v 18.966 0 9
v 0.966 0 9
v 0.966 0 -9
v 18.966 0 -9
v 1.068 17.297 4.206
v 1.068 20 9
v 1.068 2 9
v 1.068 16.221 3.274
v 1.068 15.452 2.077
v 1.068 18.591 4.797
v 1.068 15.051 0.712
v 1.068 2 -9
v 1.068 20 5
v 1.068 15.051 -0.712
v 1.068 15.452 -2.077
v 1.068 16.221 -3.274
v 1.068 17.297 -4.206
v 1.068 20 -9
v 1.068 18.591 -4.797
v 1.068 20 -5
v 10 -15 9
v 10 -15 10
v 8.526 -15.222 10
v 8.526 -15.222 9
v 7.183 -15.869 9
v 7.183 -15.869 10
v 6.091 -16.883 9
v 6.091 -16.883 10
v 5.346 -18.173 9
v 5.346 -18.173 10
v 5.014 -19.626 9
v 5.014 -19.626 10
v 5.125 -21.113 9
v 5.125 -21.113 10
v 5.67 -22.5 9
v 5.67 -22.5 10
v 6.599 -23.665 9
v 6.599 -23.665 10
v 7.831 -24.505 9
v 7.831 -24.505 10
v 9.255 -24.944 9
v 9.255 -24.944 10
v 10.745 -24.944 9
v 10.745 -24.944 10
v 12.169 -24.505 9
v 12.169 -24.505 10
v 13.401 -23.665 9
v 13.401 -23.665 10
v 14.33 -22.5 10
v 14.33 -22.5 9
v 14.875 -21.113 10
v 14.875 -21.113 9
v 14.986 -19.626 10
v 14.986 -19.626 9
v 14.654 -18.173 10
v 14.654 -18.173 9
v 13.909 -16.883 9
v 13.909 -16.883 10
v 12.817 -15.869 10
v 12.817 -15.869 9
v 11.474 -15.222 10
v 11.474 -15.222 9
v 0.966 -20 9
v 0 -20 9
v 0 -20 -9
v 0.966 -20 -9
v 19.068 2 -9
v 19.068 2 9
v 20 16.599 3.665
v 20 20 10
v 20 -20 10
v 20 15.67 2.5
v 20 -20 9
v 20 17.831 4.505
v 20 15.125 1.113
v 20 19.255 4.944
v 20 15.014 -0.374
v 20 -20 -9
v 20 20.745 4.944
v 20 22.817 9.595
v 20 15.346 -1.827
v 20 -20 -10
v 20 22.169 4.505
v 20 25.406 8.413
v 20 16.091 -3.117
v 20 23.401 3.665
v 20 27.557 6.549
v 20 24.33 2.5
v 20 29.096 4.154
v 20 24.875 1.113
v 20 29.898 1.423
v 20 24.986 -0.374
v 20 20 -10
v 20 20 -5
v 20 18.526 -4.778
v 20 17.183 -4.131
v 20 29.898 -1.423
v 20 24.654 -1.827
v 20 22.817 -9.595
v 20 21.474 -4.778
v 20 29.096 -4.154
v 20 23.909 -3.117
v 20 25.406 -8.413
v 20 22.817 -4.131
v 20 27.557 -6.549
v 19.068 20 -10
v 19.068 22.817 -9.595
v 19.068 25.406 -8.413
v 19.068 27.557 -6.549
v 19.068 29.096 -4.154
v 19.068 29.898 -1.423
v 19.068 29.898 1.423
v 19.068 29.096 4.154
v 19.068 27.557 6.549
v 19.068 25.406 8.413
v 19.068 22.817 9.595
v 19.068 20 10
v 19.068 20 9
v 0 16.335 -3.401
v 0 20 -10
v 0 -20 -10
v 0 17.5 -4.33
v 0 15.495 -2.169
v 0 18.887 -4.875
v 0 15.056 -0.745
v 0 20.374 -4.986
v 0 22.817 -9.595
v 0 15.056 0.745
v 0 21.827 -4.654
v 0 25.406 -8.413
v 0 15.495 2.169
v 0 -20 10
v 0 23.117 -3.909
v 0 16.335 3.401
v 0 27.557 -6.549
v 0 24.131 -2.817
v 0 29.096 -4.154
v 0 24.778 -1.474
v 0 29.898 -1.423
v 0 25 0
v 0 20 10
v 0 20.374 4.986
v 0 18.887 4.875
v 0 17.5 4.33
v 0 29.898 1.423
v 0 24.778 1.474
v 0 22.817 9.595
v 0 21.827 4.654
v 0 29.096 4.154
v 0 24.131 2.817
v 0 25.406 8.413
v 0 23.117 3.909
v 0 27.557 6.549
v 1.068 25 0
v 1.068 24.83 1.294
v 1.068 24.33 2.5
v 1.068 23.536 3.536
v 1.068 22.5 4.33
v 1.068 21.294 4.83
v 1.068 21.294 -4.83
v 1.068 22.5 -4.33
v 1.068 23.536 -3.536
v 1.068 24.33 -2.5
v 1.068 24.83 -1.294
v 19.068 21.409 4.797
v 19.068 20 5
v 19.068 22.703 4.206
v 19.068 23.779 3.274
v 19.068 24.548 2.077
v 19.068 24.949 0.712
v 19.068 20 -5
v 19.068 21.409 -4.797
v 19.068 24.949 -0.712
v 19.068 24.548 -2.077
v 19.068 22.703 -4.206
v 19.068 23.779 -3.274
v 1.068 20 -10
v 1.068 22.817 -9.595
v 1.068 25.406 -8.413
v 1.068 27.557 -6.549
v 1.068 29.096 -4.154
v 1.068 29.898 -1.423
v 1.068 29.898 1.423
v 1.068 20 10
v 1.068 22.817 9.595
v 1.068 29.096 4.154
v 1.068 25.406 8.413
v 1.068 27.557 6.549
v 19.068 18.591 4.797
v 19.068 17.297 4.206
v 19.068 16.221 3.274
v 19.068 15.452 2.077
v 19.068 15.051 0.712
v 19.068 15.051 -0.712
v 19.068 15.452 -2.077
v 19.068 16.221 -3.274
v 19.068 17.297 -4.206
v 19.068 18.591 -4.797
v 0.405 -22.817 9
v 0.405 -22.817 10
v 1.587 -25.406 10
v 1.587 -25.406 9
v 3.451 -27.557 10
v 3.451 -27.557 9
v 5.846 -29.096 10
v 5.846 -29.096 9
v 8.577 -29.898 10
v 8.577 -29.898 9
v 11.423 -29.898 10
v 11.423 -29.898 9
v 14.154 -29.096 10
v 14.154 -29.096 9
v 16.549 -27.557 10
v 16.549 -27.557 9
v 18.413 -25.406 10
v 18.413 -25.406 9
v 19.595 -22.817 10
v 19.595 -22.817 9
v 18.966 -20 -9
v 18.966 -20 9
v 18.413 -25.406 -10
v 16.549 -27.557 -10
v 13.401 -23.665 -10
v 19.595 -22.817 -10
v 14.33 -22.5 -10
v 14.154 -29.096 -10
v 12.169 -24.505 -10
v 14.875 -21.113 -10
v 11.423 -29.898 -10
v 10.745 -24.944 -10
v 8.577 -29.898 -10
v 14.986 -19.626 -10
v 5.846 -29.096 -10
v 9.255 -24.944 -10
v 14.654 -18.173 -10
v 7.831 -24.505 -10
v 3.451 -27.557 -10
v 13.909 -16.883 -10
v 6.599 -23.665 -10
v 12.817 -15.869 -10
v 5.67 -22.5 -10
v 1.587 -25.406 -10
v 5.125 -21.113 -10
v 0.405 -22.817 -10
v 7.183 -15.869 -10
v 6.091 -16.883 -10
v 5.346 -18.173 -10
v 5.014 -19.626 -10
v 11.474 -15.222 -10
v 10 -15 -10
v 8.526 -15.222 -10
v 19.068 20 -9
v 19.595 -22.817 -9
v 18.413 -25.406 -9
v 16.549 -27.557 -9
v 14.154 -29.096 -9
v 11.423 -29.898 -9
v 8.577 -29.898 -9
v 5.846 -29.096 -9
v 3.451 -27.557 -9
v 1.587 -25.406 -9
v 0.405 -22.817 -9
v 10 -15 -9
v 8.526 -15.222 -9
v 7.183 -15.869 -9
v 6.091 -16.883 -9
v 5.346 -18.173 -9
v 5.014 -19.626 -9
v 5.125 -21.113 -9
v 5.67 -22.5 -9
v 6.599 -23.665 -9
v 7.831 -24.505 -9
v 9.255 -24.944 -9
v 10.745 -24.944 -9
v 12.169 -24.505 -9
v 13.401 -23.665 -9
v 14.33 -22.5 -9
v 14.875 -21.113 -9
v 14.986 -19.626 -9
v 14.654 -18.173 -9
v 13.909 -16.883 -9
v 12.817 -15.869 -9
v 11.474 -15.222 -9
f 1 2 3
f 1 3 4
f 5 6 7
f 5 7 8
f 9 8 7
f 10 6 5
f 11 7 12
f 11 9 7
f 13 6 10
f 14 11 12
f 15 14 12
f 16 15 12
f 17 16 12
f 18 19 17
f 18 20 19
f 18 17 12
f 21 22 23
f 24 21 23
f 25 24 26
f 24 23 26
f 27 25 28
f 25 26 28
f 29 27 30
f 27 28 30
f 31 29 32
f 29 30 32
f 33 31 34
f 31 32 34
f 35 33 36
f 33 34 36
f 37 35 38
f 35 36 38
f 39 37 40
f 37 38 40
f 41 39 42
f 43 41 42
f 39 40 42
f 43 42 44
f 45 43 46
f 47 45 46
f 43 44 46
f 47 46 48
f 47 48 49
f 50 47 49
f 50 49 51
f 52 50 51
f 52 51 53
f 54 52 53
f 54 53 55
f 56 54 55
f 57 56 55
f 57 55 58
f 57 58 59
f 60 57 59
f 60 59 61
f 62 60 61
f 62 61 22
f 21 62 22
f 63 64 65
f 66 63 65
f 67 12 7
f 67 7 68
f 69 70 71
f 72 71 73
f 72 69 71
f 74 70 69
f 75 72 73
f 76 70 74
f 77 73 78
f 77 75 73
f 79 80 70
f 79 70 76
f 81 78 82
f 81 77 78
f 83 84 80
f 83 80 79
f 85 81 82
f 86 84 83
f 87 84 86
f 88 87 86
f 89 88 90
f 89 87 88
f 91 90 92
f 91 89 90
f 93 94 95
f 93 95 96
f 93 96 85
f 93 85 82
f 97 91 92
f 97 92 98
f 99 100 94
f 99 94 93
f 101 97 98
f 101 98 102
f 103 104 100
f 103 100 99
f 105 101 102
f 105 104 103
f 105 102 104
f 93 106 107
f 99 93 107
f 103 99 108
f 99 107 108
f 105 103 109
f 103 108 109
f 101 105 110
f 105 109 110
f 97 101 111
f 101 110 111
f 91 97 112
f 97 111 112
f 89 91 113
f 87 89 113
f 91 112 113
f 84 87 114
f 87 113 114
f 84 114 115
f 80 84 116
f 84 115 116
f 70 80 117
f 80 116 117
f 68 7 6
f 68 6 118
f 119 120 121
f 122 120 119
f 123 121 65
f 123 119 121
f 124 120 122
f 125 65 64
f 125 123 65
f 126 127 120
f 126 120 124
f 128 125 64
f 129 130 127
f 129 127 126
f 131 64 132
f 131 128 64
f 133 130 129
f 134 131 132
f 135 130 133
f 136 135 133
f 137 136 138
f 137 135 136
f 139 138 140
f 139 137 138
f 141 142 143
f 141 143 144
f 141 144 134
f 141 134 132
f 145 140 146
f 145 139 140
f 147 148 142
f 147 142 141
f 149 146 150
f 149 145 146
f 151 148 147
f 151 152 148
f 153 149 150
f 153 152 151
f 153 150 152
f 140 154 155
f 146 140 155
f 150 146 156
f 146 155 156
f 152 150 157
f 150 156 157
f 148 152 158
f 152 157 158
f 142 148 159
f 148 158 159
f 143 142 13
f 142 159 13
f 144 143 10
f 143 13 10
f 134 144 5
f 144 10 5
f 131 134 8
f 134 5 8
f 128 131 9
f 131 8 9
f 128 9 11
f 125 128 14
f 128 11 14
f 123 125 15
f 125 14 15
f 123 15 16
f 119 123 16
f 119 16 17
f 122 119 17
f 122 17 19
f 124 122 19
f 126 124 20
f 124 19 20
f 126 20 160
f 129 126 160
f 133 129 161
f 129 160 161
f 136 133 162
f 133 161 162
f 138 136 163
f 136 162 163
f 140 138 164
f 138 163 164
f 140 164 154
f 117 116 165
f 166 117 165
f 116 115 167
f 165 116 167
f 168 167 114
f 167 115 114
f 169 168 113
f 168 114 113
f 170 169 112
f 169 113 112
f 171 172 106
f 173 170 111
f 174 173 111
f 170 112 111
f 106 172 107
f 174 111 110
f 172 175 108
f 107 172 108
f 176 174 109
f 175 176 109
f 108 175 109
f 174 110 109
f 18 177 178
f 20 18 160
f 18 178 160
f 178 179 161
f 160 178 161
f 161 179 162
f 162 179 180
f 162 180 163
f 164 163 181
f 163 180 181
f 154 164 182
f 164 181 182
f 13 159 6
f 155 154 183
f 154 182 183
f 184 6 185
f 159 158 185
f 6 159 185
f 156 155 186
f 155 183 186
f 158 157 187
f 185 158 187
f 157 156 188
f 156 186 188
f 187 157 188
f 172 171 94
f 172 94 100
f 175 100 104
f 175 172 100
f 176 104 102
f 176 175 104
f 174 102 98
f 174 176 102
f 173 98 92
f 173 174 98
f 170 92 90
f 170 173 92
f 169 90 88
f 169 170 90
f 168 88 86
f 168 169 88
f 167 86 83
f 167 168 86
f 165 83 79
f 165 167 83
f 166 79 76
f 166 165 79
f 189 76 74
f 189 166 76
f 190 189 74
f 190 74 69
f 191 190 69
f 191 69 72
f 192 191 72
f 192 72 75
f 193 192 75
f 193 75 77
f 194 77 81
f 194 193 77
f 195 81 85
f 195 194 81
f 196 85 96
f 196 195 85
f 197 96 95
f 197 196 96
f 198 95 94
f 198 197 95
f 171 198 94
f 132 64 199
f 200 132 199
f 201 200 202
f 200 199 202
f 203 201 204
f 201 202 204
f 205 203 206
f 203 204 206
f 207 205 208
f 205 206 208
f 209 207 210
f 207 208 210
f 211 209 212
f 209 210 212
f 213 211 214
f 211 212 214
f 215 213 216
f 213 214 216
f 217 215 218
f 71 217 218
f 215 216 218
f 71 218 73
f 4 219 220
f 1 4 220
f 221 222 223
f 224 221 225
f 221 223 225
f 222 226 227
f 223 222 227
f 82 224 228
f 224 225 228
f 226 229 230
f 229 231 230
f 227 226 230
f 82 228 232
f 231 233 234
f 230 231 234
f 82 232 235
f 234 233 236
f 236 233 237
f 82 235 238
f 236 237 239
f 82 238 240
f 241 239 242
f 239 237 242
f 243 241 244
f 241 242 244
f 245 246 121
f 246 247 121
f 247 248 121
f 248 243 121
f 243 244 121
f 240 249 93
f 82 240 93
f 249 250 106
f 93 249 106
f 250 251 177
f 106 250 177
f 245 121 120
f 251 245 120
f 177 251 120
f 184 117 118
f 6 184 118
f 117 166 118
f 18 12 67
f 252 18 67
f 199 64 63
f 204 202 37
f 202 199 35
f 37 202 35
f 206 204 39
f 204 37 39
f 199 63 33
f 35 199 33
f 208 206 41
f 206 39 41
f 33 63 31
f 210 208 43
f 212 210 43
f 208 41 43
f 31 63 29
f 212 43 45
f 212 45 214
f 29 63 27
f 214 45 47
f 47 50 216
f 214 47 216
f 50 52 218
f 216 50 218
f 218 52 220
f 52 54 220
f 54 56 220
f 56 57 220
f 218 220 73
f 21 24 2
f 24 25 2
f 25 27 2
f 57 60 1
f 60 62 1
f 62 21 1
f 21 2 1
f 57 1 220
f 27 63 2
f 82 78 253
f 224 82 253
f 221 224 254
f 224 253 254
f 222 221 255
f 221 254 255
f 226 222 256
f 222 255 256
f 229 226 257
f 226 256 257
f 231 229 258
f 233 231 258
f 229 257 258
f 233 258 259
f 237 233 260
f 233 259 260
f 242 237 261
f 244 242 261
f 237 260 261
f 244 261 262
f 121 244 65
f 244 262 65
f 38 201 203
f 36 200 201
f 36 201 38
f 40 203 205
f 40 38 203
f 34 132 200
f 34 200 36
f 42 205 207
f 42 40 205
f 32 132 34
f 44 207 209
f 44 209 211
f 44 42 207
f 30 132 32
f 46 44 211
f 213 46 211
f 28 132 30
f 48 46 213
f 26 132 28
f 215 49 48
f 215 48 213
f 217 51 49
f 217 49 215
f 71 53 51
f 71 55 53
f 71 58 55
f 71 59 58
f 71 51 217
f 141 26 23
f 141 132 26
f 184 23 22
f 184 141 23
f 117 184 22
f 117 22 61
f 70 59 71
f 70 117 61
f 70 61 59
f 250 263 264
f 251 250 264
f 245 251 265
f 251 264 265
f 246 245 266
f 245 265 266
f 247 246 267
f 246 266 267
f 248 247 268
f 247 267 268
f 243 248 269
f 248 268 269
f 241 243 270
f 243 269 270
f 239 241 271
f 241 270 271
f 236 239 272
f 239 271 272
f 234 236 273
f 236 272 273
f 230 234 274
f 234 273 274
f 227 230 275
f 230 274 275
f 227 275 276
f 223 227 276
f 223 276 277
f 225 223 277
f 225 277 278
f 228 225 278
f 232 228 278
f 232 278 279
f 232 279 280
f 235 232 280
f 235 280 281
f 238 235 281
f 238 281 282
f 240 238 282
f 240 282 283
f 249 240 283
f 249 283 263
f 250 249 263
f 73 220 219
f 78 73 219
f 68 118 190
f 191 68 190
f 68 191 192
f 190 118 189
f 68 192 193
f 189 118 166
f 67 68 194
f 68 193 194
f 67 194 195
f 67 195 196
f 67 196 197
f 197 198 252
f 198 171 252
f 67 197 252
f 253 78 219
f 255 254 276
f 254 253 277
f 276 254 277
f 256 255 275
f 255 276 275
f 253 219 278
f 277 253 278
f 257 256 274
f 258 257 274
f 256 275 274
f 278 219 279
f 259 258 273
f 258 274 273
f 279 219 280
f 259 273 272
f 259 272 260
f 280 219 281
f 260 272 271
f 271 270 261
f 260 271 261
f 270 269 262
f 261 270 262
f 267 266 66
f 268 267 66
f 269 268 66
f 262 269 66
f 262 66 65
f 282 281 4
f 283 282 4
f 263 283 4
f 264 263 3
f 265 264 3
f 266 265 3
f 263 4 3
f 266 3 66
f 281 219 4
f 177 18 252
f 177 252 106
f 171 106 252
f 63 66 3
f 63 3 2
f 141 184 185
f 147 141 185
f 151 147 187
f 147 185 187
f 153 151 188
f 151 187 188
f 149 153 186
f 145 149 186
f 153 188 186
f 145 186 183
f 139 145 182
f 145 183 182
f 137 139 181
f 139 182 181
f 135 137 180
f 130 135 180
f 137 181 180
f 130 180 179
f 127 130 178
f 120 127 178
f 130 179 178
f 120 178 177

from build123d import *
from OCP.BRepAlgoAPI import BRepAlgoAPI_Cut
from OCP.TopTools import TopTools_ListOfShape

# Parameters (mm, degrees)
SKETCH1_W                = 20
SKETCH1_H                = 40
BOSS_EXTRUDE1_DEPTH      = 20
SKETCH3_W                = 18
SKETCH3_H                = 18
CUT_EXTRUDE1_DEPTH       = 20
BOSS_EXTRUDE2_START      = -1
BOSS_EXTRUDE2_DEPTH      = 1
BOSS_EXTRUDE3_START      = -1
SKETCH4_R                = 10
SKETCH4_R_2              = 5
BOSS_EXTRUDE3_DEPTH      = 1
SKETCH5_W                = 18
SKETCH5_H                = 18
CUT_EXTRUDE3_DEPTH       = 18
BOSS_EXTRUDE4_START      = -0.931933
SKETCH8_R                = 10
SKETCH8_R_2              = 5
BOSS_EXTRUDE4_DEPTH      = 0.931933
BOSS_EXTRUDE5_START      = -1.068067
BOSS_EXTRUDE5_DEPTH      = 1.068067
CUT_EXTRUDE4_OUTLINE_W   = 5
CUT_EXTRUDE4_OUTLINE_H   = 0.931933326
CUT_EXTRUDE4_OUTLINE_H_2 = 1.068066674
SKETCH12_R               = 5
CUT_EXTRUDE5_DEPTH       = 42.231056256


with BuildPart() as part:
    # Sketch1 → Boss-Extrude1 (new body)
    with BuildSketch(Plane(origin=(0, 0, 0), x_dir=(0, 0, -1), z_dir=(1, 0, 0))):
        Rectangle(SKETCH1_W, SKETCH1_H)
    extrude(amount=BOSS_EXTRUDE1_DEPTH)

    # Sketch3 → Cut-Extrude1 (cut)
    with BuildSketch(Plane.XZ.offset(20)):
        with Locations((9.965966663, 0)):
            Rectangle(SKETCH3_W, SKETCH3_H)
    extrude(amount=-CUT_EXTRUDE1_DEPTH, mode=Mode.SUBTRACT)

    # Sketch2 → Boss-Extrude2 (add)
    with BuildSketch(Plane.XY.offset(10).offset(BOSS_EXTRUDE2_START)):
        with BuildLine():
            ThreePointArc((0, -20), (10, -30), (20, -20))
            Line((20, -20), (0, -20))
        make_face()
    extrude(amount=BOSS_EXTRUDE2_DEPTH)

    # Sketch4 → Boss-Extrude3 (add)
    with BuildSketch(Plane(origin=(0, 0, -10), x_dir=(-1, 0, 0), z_dir=(0, 0, -1)).offset(BOSS_EXTRUDE3_START)):
        with Locations((-10, -20)):
            Circle(SKETCH4_R)
        with Locations((-10, -20)):
            Circle(SKETCH4_R_2, mode=Mode.SUBTRACT)
    extrude(amount=BOSS_EXTRUDE3_DEPTH)

    # Sketch5 → Cut-Extrude3 (cut)
    with BuildSketch(Plane(origin=(0, 20, 0), x_dir=(1, 0, 0), z_dir=(0, 1, 0))):
        with Locations((10.068066674, 0)):
            Rectangle(SKETCH5_W, SKETCH5_H)
    extrude(amount=-CUT_EXTRUDE3_DEPTH, mode=Mode.SUBTRACT)

    # Sketch8 → Boss-Extrude4 (add)
    with BuildSketch(Plane(origin=(20, 0, 0), x_dir=(0, 0, -1), z_dir=(1, 0, 0)).offset(BOSS_EXTRUDE4_START)):
        with Locations((0, 20)):
            Circle(SKETCH8_R)
        with Locations((0, 20)):
            Circle(SKETCH8_R_2, mode=Mode.SUBTRACT)
    extrude(amount=BOSS_EXTRUDE4_DEPTH)

    # Sketch7 → Boss-Extrude5 (add)
    with BuildSketch(Plane.ZY.offset(BOSS_EXTRUDE5_START)):
        with BuildLine():
            ThreePointArc((10, 20), (0, 30), (-10, 20))
            Line((-10, 20), (10, 20))
        make_face()
    extrude(amount=BOSS_EXTRUDE5_DEPTH)


with BuildPart() as cut_extrude4_tool:
    # Cut-Extrude4: read off the stored shape, not the designer's step
    # Cut-Extrude4 outline → Cut-Extrude4 (revolve)
    with BuildSketch(Plane(origin=(0, 20, 0), x_dir=(0, 1, 0), z_dir=(0, 0, -1))):
        with Locations((2.5, 19.534033337)):
            Rectangle(CUT_EXTRUDE4_OUTLINE_W, CUT_EXTRUDE4_OUTLINE_H)
        with Locations((2.5, 0.534033337)):
            Rectangle(CUT_EXTRUDE4_OUTLINE_W, CUT_EXTRUDE4_OUTLINE_H_2)
    revolve(axis=Axis((0, 20, 0), (1, 0, 0)))


with BuildPart() as part_1:
    add(part.part)

    # Cut-Extrude4: cut by cut_extrude4_tool, with a tolerance
    cut_extrude4_stock = TopTools_ListOfShape()
    cut_extrude4_stock.Append(part_1.part.wrapped)
    cut_extrude4_tools = TopTools_ListOfShape()
    cut_extrude4_tools.Append(cut_extrude4_tool.part.wrapped)
    cut_extrude4_cut = BRepAlgoAPI_Cut()
    cut_extrude4_cut.SetArguments(cut_extrude4_stock)
    cut_extrude4_cut.SetTools(cut_extrude4_tools)
    cut_extrude4_cut.SetFuzzyValue(0.00001)
    cut_extrude4_cut.Build()
    add(Compound.cast(cut_extrude4_cut.Shape()).solids(), mode=Mode.REPLACE)

    # Sketch12 → Cut-Extrude5 (cut, through all)
    with BuildSketch(Plane.XY.offset(10)):
        with Locations(Location((10, -20, 0), (0, 0, 90))):
            Circle(SKETCH12_R)
    extrude(amount=-CUT_EXTRUDE5_DEPTH, mode=Mode.SUBTRACT)


solid = part_1.part
